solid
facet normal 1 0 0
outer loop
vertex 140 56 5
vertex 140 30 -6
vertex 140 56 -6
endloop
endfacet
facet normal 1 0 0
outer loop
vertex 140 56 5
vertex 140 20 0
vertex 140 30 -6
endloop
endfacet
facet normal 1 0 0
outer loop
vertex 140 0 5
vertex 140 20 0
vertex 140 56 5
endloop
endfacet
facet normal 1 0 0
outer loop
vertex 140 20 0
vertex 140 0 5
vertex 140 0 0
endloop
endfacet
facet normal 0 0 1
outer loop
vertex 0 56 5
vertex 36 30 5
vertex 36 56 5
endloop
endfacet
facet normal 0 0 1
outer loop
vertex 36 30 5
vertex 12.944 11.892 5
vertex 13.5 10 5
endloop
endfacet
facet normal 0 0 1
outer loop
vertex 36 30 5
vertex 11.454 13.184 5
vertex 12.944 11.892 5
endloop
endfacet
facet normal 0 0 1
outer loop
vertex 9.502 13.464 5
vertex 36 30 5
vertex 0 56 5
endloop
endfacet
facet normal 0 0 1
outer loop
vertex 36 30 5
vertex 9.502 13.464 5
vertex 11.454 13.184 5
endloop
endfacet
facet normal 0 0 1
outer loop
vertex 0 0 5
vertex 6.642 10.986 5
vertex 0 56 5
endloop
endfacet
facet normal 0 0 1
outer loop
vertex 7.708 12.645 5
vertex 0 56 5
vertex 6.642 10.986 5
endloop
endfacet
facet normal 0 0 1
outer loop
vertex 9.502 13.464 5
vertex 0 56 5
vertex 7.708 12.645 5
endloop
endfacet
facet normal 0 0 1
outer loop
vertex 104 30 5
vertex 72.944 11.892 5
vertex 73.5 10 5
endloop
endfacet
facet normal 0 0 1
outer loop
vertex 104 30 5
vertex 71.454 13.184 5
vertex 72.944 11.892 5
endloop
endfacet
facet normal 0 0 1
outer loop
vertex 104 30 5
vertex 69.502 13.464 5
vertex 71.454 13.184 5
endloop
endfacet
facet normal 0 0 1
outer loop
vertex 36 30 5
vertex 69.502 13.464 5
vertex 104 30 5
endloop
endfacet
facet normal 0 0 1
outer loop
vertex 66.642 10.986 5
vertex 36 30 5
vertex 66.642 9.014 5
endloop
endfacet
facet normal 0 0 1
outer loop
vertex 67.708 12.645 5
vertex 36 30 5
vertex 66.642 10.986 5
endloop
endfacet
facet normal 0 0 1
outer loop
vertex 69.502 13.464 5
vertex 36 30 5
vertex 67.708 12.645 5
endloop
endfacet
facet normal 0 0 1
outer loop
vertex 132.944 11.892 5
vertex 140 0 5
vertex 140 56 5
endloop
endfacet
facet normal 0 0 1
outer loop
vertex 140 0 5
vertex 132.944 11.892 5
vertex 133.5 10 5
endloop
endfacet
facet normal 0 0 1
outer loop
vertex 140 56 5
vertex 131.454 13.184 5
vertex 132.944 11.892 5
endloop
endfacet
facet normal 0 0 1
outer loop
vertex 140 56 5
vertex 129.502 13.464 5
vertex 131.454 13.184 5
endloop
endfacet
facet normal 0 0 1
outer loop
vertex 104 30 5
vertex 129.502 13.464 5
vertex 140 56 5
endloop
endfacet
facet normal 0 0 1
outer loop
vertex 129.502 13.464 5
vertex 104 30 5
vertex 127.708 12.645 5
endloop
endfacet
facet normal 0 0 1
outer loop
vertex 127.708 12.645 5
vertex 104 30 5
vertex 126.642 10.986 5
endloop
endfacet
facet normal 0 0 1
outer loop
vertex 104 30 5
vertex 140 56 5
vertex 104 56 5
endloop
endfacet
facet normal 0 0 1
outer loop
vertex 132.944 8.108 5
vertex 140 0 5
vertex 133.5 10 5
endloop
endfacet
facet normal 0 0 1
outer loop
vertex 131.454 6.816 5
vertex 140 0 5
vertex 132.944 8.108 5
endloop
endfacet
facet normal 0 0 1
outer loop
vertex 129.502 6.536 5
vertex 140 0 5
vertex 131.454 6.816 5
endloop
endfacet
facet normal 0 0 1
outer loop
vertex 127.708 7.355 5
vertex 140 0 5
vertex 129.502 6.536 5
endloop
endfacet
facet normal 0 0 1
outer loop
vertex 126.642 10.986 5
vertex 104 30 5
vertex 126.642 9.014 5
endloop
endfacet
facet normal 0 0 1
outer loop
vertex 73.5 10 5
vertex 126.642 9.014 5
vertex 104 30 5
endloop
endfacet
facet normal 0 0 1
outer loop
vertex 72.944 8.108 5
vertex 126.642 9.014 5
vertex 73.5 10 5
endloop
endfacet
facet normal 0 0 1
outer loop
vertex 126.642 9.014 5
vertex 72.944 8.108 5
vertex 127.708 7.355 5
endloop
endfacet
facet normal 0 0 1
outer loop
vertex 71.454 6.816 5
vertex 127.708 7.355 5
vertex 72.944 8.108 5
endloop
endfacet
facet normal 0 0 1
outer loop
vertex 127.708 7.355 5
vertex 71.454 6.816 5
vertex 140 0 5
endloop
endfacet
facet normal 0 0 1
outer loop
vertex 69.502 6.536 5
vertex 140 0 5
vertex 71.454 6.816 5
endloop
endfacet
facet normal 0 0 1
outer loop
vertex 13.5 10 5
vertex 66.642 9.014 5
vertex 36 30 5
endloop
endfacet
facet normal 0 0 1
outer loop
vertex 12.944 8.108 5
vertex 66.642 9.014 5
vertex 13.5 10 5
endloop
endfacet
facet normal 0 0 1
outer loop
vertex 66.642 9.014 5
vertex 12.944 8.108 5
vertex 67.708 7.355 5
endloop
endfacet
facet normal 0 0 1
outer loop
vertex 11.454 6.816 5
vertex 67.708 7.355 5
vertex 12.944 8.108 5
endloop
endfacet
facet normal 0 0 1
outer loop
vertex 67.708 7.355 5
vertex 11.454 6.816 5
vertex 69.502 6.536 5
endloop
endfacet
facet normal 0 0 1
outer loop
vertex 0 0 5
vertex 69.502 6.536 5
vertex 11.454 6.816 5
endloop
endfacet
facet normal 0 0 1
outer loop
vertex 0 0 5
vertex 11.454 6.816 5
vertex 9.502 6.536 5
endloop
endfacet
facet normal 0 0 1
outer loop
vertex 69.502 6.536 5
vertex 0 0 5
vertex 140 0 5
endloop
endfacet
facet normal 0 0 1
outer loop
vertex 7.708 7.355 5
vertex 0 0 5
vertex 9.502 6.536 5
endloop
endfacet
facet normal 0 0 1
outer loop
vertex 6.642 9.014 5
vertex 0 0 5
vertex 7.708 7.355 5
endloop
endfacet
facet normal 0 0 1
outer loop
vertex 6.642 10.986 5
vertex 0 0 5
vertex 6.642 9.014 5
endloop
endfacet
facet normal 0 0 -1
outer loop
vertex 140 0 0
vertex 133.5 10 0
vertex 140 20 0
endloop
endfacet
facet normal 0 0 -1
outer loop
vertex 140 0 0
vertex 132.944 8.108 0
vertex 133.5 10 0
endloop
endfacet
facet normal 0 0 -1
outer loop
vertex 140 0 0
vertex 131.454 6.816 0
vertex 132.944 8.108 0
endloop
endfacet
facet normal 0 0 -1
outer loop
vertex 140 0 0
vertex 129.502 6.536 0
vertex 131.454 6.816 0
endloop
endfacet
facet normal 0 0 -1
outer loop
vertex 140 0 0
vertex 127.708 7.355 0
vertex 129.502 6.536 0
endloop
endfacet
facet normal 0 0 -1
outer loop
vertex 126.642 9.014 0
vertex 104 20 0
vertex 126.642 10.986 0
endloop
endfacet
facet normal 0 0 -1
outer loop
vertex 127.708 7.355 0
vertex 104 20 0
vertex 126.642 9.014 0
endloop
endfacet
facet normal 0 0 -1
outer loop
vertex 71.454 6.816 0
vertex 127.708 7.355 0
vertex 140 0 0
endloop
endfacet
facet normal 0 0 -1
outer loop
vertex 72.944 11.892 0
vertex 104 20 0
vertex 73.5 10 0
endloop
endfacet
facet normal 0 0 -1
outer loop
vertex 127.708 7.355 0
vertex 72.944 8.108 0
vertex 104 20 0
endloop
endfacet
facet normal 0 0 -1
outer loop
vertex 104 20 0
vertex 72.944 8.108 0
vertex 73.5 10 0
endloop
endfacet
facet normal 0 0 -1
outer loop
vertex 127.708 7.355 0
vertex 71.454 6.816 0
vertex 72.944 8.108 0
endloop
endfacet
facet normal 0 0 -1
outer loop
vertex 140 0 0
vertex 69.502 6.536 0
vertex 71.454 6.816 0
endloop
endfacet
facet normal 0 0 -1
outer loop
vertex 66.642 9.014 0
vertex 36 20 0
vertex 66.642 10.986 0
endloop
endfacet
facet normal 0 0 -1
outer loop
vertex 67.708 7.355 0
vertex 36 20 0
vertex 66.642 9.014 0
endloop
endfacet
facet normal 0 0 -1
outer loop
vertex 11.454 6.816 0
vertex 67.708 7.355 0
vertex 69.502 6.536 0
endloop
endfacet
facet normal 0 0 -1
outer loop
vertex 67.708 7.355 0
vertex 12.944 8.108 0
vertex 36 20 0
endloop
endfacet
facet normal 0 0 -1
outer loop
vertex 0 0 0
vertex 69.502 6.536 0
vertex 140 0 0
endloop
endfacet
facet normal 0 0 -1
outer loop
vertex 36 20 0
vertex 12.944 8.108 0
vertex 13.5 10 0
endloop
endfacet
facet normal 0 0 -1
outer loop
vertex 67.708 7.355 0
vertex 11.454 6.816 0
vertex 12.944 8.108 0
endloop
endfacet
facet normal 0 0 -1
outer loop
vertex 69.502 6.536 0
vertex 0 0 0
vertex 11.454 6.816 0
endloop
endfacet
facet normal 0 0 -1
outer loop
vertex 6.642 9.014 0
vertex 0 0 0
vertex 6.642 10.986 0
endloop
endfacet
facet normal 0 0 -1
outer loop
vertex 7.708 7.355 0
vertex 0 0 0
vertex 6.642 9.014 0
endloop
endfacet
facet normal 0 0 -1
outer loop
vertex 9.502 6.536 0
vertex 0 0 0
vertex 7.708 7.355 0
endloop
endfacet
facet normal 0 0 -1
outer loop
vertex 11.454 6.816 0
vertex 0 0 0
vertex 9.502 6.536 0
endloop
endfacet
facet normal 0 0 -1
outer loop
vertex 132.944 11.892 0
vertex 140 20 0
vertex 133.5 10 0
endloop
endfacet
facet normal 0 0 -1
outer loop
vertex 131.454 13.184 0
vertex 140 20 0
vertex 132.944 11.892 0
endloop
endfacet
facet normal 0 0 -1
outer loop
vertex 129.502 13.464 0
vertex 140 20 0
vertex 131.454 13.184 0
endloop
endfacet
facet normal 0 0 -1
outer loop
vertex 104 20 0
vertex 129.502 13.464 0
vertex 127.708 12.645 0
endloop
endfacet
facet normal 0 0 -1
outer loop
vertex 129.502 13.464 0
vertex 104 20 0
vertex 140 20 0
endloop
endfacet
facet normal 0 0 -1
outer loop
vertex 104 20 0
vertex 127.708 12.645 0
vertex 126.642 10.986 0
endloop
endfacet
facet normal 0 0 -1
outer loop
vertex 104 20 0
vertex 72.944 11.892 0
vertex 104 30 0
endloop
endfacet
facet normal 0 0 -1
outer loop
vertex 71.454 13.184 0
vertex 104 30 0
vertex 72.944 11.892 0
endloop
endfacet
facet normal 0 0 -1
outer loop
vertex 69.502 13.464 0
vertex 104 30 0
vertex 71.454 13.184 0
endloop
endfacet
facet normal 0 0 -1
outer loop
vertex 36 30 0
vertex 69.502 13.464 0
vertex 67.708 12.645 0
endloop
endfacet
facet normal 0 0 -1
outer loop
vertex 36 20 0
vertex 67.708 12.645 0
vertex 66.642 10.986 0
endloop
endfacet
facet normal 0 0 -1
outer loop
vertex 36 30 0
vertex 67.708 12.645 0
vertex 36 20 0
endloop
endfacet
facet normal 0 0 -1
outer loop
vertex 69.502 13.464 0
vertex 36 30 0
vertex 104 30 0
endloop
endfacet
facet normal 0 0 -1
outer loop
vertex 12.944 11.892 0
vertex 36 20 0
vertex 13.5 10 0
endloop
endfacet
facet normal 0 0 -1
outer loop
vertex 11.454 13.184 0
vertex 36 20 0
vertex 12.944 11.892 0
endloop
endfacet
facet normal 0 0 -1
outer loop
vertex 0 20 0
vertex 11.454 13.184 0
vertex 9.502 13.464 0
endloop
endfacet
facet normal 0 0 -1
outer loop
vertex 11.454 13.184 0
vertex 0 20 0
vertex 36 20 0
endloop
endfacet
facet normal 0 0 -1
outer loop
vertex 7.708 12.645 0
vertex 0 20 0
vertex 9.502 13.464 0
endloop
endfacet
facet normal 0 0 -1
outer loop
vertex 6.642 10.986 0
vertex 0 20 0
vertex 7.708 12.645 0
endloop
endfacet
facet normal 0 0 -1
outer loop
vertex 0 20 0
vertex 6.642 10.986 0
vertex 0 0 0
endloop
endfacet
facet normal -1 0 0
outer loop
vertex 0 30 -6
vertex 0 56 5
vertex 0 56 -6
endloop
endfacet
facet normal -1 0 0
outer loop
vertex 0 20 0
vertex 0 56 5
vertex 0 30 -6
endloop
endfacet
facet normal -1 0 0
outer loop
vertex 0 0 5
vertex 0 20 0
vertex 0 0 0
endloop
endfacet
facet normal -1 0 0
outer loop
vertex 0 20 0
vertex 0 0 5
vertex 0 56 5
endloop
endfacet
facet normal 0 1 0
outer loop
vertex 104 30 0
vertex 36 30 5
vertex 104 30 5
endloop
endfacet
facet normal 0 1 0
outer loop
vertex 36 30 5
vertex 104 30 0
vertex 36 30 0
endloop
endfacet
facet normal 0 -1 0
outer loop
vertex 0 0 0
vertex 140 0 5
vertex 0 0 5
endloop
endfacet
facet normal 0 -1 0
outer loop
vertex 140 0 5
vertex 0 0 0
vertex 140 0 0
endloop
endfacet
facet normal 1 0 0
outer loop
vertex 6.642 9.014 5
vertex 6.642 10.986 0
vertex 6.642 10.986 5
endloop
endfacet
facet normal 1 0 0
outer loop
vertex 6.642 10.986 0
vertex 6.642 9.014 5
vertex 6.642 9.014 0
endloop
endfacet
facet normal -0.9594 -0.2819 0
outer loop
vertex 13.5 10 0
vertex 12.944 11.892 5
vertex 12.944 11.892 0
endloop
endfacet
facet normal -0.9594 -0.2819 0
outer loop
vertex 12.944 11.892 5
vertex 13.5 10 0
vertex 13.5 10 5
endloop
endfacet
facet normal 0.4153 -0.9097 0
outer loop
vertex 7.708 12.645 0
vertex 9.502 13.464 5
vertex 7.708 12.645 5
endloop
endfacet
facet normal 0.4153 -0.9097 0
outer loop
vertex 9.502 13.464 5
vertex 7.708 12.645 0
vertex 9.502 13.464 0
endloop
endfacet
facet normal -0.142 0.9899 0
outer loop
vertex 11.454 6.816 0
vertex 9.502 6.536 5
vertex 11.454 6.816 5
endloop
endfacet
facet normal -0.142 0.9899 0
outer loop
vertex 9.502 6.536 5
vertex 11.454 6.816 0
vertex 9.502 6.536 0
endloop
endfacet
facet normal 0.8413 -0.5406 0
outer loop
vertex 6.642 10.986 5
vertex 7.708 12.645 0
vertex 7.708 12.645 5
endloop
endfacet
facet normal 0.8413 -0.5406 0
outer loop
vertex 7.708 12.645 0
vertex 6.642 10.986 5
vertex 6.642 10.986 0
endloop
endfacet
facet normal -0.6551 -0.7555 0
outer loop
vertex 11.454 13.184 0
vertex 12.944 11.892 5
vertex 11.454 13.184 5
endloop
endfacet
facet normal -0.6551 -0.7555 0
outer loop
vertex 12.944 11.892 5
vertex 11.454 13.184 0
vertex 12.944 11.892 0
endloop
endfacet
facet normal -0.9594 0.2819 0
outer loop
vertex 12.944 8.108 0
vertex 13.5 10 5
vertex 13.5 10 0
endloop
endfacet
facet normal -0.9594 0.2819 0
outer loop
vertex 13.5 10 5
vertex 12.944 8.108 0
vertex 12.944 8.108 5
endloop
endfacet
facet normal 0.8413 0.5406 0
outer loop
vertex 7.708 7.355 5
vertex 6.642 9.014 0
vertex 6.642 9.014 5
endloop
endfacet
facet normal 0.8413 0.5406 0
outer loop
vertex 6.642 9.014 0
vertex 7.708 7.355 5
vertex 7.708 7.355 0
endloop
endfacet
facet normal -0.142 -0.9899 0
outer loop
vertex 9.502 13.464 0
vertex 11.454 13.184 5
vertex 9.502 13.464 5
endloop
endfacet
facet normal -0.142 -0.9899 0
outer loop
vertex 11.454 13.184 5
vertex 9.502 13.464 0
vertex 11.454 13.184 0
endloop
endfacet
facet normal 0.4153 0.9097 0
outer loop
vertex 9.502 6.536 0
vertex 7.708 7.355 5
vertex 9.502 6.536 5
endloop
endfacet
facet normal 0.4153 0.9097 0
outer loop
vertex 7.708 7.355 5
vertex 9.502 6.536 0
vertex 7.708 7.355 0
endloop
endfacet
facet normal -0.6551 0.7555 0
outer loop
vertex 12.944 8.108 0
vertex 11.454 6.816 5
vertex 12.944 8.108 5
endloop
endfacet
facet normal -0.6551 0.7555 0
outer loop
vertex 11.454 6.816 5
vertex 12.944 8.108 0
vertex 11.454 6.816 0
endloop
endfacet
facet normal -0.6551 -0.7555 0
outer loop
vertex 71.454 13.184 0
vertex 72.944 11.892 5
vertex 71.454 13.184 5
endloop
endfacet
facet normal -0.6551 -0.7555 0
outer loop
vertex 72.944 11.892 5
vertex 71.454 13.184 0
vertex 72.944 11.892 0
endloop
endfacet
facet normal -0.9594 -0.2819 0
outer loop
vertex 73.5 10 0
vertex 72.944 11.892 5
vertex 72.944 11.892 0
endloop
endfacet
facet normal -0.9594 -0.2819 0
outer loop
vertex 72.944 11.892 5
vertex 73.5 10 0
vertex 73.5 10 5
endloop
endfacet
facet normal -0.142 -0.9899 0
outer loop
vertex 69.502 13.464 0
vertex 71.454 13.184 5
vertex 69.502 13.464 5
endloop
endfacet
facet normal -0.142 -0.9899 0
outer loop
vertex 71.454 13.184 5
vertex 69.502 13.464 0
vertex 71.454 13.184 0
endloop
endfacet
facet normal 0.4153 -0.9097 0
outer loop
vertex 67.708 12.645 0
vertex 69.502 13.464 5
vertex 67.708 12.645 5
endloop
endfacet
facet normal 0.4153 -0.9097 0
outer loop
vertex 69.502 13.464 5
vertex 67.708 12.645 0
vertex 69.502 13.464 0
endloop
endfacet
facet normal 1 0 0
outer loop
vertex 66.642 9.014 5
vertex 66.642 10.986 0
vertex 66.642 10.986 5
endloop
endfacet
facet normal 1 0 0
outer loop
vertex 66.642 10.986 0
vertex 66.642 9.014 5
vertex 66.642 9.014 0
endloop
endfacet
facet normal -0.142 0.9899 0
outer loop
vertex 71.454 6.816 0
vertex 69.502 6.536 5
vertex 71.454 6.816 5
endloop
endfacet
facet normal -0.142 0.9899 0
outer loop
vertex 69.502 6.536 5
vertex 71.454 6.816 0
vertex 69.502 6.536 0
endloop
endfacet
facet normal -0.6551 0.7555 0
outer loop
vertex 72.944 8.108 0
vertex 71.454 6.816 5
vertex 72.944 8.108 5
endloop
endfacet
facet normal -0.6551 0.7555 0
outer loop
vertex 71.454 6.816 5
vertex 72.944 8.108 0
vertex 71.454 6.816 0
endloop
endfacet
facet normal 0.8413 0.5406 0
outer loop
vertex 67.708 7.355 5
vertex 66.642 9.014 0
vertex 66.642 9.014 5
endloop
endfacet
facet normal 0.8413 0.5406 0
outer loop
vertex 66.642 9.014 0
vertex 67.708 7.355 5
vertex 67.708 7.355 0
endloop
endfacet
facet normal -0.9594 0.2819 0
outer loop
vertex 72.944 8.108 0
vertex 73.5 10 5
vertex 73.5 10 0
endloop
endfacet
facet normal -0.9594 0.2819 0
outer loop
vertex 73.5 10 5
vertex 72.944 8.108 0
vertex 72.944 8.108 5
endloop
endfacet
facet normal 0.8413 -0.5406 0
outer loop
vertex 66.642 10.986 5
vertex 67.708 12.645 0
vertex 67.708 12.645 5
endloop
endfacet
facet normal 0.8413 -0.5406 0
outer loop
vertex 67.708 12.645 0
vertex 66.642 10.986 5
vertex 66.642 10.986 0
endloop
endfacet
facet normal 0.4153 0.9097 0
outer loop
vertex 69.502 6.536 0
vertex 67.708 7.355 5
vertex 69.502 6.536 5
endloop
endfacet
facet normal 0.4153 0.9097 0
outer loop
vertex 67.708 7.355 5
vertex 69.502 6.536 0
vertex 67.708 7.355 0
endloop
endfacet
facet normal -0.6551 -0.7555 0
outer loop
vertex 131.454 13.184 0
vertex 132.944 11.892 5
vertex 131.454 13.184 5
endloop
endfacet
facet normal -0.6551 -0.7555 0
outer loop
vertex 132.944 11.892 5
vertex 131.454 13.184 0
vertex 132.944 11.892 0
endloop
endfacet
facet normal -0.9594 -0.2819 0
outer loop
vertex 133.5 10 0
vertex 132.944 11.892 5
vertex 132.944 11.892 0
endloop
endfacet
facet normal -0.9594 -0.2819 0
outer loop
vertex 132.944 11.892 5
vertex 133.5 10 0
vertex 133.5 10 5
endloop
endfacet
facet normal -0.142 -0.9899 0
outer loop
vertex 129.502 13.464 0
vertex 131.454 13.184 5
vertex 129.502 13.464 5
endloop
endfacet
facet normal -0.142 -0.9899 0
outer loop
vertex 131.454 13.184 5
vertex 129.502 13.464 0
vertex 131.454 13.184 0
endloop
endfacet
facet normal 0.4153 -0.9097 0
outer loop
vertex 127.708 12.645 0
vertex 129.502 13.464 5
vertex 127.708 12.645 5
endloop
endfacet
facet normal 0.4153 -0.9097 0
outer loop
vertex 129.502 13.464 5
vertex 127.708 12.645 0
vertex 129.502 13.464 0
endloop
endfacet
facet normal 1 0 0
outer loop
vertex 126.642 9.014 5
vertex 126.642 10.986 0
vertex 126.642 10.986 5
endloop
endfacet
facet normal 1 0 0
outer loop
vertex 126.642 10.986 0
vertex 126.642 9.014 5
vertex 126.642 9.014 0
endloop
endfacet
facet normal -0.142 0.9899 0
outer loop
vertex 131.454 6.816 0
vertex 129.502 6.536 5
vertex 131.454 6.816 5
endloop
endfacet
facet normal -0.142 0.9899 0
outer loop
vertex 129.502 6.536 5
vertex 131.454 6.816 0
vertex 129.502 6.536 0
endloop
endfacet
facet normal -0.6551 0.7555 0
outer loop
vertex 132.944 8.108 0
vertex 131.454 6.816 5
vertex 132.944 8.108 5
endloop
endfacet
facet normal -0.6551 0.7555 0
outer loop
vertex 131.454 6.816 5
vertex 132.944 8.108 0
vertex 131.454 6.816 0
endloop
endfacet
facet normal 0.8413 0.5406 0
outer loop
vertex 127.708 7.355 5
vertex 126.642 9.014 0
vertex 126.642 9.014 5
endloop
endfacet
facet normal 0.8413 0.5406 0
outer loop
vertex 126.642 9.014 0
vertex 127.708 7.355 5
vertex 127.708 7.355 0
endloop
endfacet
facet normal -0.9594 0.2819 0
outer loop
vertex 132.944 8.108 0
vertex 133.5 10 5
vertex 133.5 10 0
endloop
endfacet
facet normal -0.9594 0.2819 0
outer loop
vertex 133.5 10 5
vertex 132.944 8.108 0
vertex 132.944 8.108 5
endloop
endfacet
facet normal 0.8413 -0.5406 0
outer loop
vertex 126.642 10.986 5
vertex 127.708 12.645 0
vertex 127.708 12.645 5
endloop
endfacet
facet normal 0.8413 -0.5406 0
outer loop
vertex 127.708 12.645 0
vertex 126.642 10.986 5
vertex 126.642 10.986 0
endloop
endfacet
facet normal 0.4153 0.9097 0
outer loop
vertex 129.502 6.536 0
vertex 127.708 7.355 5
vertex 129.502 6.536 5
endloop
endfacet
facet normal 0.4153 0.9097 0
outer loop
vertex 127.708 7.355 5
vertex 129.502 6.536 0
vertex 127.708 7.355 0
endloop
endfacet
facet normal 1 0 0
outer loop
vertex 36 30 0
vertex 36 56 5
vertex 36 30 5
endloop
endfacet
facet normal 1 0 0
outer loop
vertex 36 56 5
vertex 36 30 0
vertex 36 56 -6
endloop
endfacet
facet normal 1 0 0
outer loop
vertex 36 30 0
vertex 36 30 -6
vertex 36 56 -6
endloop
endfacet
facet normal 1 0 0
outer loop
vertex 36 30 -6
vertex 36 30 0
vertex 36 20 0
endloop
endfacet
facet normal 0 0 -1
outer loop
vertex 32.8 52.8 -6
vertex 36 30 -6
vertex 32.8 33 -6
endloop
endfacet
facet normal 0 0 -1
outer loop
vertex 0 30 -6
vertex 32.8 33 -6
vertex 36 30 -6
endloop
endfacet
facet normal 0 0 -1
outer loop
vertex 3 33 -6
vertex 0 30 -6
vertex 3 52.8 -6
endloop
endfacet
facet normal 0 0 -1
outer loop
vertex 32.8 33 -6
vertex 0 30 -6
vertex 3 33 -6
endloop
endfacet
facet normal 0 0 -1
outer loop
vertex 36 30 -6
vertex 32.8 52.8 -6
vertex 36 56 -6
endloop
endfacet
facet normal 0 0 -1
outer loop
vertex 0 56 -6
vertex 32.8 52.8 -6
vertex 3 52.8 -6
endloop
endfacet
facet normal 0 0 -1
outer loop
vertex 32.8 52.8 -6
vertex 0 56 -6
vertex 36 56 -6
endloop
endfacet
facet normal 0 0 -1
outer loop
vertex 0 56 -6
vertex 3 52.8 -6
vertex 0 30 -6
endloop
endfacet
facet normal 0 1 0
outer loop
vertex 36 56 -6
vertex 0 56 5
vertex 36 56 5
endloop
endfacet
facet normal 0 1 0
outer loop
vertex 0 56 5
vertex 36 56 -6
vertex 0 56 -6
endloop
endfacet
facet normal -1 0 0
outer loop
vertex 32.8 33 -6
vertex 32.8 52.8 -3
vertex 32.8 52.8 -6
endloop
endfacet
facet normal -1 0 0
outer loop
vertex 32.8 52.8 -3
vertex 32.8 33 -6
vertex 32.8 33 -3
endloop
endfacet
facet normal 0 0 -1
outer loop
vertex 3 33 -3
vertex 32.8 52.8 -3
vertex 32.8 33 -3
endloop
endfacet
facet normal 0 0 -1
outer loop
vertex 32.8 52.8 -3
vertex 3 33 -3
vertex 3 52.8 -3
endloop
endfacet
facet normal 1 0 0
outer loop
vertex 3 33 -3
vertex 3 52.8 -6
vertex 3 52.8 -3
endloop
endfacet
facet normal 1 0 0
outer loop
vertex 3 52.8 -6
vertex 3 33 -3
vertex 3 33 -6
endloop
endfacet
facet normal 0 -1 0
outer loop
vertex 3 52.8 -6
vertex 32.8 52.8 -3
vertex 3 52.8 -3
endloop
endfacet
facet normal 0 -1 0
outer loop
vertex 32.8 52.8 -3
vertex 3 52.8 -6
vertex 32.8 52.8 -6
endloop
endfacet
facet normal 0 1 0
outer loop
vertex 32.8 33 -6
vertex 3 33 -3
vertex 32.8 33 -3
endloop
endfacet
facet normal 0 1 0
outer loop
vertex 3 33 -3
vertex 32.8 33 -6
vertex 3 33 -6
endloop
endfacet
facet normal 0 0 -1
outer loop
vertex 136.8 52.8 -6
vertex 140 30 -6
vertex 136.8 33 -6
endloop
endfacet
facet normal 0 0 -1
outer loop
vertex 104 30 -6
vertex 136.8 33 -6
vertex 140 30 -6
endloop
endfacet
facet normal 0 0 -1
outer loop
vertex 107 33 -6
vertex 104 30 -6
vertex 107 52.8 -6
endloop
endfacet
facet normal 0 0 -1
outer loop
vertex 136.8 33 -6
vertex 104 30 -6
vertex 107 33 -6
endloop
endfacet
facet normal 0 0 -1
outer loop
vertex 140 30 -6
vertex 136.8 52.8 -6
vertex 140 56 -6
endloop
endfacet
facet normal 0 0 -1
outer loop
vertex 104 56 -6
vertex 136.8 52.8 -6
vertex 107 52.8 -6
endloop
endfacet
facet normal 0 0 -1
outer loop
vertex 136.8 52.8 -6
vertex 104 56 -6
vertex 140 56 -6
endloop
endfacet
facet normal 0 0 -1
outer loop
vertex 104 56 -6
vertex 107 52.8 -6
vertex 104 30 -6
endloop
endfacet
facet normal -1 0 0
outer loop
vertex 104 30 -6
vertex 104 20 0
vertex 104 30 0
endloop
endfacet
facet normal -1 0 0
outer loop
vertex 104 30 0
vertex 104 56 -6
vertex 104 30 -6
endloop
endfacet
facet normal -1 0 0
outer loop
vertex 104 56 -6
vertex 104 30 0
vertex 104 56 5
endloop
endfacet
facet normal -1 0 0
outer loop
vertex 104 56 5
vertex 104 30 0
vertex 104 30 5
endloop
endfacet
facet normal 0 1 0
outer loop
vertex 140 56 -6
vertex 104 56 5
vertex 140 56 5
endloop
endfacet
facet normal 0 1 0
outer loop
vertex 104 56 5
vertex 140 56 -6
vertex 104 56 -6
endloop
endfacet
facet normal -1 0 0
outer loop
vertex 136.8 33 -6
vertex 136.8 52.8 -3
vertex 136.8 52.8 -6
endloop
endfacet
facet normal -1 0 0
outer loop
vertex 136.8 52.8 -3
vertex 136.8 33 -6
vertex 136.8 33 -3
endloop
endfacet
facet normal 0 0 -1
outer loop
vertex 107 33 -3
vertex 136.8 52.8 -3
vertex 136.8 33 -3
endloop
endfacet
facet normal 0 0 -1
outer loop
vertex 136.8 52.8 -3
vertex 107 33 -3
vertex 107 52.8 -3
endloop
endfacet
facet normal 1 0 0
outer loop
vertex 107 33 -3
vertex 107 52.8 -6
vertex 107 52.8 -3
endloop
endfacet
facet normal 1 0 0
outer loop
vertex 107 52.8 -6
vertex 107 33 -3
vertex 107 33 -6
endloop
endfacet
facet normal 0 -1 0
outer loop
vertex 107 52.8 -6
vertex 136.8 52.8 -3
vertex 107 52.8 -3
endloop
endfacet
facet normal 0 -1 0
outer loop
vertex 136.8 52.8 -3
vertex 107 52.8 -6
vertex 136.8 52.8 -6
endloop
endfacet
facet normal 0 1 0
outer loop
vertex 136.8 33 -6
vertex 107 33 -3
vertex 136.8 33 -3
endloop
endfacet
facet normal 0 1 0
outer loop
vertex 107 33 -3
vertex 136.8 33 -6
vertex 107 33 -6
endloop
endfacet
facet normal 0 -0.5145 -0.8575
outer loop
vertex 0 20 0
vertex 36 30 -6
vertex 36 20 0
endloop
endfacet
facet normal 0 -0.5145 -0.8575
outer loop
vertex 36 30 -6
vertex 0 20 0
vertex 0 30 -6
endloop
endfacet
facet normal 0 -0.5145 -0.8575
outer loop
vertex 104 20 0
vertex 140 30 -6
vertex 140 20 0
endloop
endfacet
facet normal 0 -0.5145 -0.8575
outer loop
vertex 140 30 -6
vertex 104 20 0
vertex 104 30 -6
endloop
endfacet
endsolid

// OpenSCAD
length = 20;
slot_width = 6.4;
rail_width = 8.8;


module rail_holder(){
    union(){
        
        cube([slot_width,length,6.1]);
        
        translate([0-((20-slot_width)/2),0,6.1]){
            cube([20,length,6]);
        }
        //side piece
        translate([0-((20-slot_width)/2)-3,0,-10]){
            cube([3,length,22.1]);
        }
        //side piece
        translate([20-((20-slot_width)/2),0,-10]){
            cube([3,length,22.1]);
        }
        //rail holder
        union(){
            translate([0-((20-slot_width)/2)-3,2.5,9.1]){
                 difference(){
                    cube([20,15,15]);
                        translate([3,(15-rail_width)/2,8]){
                            cube([20,rail_width,10]);
                        }
                    
                }
            }
            translate([0-((20-slot_width)/2),2.5+(15-rail_width)/2,22.1]){
                cube([17,1,1]);
            }
            translate([0-((20-slot_width)/2),13.4,22.1]){
                cube([17,1,1]);
            }
        }
    }    
}

module slope(){
    linear_extrude(36){
        polygon(points=[[0,0],[0,10],[6,0]]);
    }
}

module bearing_block(){
    difference(){    
            cube([36,26,11]);
            translate([3,3,0]){
                cube([29.8,19.8,3]);
            }
    }
}

module plate_holder(){
    difference(){
        cube([140,30,5]);
        translate([10,10,0]){
            cylinder(5,3.5,3.5);
        }
        translate([70,10,0]){
            cylinder(5,3.5,3.5);
        }
        translate([130,10,0]){
            cylinder(5,3.5,3.5);
        }
    }
    //translate([0,30,-6]){
    //    bearing_block();
    //}
    translate([0,30,-6]){
        bearing_block();
    }
    translate([36,30,0]){
        rotate([180,90,0]){
            slope();
        }
    }
    
    translate([104,30,-6]){
        bearing_block();
    }
    translate([140,30,0]){
        rotate([180,90,0]){
            slope();
        }
    }
    
    
}

//you need 2 of these
plate_holder();

//and 4 of these
//bearing_block();
   
    
